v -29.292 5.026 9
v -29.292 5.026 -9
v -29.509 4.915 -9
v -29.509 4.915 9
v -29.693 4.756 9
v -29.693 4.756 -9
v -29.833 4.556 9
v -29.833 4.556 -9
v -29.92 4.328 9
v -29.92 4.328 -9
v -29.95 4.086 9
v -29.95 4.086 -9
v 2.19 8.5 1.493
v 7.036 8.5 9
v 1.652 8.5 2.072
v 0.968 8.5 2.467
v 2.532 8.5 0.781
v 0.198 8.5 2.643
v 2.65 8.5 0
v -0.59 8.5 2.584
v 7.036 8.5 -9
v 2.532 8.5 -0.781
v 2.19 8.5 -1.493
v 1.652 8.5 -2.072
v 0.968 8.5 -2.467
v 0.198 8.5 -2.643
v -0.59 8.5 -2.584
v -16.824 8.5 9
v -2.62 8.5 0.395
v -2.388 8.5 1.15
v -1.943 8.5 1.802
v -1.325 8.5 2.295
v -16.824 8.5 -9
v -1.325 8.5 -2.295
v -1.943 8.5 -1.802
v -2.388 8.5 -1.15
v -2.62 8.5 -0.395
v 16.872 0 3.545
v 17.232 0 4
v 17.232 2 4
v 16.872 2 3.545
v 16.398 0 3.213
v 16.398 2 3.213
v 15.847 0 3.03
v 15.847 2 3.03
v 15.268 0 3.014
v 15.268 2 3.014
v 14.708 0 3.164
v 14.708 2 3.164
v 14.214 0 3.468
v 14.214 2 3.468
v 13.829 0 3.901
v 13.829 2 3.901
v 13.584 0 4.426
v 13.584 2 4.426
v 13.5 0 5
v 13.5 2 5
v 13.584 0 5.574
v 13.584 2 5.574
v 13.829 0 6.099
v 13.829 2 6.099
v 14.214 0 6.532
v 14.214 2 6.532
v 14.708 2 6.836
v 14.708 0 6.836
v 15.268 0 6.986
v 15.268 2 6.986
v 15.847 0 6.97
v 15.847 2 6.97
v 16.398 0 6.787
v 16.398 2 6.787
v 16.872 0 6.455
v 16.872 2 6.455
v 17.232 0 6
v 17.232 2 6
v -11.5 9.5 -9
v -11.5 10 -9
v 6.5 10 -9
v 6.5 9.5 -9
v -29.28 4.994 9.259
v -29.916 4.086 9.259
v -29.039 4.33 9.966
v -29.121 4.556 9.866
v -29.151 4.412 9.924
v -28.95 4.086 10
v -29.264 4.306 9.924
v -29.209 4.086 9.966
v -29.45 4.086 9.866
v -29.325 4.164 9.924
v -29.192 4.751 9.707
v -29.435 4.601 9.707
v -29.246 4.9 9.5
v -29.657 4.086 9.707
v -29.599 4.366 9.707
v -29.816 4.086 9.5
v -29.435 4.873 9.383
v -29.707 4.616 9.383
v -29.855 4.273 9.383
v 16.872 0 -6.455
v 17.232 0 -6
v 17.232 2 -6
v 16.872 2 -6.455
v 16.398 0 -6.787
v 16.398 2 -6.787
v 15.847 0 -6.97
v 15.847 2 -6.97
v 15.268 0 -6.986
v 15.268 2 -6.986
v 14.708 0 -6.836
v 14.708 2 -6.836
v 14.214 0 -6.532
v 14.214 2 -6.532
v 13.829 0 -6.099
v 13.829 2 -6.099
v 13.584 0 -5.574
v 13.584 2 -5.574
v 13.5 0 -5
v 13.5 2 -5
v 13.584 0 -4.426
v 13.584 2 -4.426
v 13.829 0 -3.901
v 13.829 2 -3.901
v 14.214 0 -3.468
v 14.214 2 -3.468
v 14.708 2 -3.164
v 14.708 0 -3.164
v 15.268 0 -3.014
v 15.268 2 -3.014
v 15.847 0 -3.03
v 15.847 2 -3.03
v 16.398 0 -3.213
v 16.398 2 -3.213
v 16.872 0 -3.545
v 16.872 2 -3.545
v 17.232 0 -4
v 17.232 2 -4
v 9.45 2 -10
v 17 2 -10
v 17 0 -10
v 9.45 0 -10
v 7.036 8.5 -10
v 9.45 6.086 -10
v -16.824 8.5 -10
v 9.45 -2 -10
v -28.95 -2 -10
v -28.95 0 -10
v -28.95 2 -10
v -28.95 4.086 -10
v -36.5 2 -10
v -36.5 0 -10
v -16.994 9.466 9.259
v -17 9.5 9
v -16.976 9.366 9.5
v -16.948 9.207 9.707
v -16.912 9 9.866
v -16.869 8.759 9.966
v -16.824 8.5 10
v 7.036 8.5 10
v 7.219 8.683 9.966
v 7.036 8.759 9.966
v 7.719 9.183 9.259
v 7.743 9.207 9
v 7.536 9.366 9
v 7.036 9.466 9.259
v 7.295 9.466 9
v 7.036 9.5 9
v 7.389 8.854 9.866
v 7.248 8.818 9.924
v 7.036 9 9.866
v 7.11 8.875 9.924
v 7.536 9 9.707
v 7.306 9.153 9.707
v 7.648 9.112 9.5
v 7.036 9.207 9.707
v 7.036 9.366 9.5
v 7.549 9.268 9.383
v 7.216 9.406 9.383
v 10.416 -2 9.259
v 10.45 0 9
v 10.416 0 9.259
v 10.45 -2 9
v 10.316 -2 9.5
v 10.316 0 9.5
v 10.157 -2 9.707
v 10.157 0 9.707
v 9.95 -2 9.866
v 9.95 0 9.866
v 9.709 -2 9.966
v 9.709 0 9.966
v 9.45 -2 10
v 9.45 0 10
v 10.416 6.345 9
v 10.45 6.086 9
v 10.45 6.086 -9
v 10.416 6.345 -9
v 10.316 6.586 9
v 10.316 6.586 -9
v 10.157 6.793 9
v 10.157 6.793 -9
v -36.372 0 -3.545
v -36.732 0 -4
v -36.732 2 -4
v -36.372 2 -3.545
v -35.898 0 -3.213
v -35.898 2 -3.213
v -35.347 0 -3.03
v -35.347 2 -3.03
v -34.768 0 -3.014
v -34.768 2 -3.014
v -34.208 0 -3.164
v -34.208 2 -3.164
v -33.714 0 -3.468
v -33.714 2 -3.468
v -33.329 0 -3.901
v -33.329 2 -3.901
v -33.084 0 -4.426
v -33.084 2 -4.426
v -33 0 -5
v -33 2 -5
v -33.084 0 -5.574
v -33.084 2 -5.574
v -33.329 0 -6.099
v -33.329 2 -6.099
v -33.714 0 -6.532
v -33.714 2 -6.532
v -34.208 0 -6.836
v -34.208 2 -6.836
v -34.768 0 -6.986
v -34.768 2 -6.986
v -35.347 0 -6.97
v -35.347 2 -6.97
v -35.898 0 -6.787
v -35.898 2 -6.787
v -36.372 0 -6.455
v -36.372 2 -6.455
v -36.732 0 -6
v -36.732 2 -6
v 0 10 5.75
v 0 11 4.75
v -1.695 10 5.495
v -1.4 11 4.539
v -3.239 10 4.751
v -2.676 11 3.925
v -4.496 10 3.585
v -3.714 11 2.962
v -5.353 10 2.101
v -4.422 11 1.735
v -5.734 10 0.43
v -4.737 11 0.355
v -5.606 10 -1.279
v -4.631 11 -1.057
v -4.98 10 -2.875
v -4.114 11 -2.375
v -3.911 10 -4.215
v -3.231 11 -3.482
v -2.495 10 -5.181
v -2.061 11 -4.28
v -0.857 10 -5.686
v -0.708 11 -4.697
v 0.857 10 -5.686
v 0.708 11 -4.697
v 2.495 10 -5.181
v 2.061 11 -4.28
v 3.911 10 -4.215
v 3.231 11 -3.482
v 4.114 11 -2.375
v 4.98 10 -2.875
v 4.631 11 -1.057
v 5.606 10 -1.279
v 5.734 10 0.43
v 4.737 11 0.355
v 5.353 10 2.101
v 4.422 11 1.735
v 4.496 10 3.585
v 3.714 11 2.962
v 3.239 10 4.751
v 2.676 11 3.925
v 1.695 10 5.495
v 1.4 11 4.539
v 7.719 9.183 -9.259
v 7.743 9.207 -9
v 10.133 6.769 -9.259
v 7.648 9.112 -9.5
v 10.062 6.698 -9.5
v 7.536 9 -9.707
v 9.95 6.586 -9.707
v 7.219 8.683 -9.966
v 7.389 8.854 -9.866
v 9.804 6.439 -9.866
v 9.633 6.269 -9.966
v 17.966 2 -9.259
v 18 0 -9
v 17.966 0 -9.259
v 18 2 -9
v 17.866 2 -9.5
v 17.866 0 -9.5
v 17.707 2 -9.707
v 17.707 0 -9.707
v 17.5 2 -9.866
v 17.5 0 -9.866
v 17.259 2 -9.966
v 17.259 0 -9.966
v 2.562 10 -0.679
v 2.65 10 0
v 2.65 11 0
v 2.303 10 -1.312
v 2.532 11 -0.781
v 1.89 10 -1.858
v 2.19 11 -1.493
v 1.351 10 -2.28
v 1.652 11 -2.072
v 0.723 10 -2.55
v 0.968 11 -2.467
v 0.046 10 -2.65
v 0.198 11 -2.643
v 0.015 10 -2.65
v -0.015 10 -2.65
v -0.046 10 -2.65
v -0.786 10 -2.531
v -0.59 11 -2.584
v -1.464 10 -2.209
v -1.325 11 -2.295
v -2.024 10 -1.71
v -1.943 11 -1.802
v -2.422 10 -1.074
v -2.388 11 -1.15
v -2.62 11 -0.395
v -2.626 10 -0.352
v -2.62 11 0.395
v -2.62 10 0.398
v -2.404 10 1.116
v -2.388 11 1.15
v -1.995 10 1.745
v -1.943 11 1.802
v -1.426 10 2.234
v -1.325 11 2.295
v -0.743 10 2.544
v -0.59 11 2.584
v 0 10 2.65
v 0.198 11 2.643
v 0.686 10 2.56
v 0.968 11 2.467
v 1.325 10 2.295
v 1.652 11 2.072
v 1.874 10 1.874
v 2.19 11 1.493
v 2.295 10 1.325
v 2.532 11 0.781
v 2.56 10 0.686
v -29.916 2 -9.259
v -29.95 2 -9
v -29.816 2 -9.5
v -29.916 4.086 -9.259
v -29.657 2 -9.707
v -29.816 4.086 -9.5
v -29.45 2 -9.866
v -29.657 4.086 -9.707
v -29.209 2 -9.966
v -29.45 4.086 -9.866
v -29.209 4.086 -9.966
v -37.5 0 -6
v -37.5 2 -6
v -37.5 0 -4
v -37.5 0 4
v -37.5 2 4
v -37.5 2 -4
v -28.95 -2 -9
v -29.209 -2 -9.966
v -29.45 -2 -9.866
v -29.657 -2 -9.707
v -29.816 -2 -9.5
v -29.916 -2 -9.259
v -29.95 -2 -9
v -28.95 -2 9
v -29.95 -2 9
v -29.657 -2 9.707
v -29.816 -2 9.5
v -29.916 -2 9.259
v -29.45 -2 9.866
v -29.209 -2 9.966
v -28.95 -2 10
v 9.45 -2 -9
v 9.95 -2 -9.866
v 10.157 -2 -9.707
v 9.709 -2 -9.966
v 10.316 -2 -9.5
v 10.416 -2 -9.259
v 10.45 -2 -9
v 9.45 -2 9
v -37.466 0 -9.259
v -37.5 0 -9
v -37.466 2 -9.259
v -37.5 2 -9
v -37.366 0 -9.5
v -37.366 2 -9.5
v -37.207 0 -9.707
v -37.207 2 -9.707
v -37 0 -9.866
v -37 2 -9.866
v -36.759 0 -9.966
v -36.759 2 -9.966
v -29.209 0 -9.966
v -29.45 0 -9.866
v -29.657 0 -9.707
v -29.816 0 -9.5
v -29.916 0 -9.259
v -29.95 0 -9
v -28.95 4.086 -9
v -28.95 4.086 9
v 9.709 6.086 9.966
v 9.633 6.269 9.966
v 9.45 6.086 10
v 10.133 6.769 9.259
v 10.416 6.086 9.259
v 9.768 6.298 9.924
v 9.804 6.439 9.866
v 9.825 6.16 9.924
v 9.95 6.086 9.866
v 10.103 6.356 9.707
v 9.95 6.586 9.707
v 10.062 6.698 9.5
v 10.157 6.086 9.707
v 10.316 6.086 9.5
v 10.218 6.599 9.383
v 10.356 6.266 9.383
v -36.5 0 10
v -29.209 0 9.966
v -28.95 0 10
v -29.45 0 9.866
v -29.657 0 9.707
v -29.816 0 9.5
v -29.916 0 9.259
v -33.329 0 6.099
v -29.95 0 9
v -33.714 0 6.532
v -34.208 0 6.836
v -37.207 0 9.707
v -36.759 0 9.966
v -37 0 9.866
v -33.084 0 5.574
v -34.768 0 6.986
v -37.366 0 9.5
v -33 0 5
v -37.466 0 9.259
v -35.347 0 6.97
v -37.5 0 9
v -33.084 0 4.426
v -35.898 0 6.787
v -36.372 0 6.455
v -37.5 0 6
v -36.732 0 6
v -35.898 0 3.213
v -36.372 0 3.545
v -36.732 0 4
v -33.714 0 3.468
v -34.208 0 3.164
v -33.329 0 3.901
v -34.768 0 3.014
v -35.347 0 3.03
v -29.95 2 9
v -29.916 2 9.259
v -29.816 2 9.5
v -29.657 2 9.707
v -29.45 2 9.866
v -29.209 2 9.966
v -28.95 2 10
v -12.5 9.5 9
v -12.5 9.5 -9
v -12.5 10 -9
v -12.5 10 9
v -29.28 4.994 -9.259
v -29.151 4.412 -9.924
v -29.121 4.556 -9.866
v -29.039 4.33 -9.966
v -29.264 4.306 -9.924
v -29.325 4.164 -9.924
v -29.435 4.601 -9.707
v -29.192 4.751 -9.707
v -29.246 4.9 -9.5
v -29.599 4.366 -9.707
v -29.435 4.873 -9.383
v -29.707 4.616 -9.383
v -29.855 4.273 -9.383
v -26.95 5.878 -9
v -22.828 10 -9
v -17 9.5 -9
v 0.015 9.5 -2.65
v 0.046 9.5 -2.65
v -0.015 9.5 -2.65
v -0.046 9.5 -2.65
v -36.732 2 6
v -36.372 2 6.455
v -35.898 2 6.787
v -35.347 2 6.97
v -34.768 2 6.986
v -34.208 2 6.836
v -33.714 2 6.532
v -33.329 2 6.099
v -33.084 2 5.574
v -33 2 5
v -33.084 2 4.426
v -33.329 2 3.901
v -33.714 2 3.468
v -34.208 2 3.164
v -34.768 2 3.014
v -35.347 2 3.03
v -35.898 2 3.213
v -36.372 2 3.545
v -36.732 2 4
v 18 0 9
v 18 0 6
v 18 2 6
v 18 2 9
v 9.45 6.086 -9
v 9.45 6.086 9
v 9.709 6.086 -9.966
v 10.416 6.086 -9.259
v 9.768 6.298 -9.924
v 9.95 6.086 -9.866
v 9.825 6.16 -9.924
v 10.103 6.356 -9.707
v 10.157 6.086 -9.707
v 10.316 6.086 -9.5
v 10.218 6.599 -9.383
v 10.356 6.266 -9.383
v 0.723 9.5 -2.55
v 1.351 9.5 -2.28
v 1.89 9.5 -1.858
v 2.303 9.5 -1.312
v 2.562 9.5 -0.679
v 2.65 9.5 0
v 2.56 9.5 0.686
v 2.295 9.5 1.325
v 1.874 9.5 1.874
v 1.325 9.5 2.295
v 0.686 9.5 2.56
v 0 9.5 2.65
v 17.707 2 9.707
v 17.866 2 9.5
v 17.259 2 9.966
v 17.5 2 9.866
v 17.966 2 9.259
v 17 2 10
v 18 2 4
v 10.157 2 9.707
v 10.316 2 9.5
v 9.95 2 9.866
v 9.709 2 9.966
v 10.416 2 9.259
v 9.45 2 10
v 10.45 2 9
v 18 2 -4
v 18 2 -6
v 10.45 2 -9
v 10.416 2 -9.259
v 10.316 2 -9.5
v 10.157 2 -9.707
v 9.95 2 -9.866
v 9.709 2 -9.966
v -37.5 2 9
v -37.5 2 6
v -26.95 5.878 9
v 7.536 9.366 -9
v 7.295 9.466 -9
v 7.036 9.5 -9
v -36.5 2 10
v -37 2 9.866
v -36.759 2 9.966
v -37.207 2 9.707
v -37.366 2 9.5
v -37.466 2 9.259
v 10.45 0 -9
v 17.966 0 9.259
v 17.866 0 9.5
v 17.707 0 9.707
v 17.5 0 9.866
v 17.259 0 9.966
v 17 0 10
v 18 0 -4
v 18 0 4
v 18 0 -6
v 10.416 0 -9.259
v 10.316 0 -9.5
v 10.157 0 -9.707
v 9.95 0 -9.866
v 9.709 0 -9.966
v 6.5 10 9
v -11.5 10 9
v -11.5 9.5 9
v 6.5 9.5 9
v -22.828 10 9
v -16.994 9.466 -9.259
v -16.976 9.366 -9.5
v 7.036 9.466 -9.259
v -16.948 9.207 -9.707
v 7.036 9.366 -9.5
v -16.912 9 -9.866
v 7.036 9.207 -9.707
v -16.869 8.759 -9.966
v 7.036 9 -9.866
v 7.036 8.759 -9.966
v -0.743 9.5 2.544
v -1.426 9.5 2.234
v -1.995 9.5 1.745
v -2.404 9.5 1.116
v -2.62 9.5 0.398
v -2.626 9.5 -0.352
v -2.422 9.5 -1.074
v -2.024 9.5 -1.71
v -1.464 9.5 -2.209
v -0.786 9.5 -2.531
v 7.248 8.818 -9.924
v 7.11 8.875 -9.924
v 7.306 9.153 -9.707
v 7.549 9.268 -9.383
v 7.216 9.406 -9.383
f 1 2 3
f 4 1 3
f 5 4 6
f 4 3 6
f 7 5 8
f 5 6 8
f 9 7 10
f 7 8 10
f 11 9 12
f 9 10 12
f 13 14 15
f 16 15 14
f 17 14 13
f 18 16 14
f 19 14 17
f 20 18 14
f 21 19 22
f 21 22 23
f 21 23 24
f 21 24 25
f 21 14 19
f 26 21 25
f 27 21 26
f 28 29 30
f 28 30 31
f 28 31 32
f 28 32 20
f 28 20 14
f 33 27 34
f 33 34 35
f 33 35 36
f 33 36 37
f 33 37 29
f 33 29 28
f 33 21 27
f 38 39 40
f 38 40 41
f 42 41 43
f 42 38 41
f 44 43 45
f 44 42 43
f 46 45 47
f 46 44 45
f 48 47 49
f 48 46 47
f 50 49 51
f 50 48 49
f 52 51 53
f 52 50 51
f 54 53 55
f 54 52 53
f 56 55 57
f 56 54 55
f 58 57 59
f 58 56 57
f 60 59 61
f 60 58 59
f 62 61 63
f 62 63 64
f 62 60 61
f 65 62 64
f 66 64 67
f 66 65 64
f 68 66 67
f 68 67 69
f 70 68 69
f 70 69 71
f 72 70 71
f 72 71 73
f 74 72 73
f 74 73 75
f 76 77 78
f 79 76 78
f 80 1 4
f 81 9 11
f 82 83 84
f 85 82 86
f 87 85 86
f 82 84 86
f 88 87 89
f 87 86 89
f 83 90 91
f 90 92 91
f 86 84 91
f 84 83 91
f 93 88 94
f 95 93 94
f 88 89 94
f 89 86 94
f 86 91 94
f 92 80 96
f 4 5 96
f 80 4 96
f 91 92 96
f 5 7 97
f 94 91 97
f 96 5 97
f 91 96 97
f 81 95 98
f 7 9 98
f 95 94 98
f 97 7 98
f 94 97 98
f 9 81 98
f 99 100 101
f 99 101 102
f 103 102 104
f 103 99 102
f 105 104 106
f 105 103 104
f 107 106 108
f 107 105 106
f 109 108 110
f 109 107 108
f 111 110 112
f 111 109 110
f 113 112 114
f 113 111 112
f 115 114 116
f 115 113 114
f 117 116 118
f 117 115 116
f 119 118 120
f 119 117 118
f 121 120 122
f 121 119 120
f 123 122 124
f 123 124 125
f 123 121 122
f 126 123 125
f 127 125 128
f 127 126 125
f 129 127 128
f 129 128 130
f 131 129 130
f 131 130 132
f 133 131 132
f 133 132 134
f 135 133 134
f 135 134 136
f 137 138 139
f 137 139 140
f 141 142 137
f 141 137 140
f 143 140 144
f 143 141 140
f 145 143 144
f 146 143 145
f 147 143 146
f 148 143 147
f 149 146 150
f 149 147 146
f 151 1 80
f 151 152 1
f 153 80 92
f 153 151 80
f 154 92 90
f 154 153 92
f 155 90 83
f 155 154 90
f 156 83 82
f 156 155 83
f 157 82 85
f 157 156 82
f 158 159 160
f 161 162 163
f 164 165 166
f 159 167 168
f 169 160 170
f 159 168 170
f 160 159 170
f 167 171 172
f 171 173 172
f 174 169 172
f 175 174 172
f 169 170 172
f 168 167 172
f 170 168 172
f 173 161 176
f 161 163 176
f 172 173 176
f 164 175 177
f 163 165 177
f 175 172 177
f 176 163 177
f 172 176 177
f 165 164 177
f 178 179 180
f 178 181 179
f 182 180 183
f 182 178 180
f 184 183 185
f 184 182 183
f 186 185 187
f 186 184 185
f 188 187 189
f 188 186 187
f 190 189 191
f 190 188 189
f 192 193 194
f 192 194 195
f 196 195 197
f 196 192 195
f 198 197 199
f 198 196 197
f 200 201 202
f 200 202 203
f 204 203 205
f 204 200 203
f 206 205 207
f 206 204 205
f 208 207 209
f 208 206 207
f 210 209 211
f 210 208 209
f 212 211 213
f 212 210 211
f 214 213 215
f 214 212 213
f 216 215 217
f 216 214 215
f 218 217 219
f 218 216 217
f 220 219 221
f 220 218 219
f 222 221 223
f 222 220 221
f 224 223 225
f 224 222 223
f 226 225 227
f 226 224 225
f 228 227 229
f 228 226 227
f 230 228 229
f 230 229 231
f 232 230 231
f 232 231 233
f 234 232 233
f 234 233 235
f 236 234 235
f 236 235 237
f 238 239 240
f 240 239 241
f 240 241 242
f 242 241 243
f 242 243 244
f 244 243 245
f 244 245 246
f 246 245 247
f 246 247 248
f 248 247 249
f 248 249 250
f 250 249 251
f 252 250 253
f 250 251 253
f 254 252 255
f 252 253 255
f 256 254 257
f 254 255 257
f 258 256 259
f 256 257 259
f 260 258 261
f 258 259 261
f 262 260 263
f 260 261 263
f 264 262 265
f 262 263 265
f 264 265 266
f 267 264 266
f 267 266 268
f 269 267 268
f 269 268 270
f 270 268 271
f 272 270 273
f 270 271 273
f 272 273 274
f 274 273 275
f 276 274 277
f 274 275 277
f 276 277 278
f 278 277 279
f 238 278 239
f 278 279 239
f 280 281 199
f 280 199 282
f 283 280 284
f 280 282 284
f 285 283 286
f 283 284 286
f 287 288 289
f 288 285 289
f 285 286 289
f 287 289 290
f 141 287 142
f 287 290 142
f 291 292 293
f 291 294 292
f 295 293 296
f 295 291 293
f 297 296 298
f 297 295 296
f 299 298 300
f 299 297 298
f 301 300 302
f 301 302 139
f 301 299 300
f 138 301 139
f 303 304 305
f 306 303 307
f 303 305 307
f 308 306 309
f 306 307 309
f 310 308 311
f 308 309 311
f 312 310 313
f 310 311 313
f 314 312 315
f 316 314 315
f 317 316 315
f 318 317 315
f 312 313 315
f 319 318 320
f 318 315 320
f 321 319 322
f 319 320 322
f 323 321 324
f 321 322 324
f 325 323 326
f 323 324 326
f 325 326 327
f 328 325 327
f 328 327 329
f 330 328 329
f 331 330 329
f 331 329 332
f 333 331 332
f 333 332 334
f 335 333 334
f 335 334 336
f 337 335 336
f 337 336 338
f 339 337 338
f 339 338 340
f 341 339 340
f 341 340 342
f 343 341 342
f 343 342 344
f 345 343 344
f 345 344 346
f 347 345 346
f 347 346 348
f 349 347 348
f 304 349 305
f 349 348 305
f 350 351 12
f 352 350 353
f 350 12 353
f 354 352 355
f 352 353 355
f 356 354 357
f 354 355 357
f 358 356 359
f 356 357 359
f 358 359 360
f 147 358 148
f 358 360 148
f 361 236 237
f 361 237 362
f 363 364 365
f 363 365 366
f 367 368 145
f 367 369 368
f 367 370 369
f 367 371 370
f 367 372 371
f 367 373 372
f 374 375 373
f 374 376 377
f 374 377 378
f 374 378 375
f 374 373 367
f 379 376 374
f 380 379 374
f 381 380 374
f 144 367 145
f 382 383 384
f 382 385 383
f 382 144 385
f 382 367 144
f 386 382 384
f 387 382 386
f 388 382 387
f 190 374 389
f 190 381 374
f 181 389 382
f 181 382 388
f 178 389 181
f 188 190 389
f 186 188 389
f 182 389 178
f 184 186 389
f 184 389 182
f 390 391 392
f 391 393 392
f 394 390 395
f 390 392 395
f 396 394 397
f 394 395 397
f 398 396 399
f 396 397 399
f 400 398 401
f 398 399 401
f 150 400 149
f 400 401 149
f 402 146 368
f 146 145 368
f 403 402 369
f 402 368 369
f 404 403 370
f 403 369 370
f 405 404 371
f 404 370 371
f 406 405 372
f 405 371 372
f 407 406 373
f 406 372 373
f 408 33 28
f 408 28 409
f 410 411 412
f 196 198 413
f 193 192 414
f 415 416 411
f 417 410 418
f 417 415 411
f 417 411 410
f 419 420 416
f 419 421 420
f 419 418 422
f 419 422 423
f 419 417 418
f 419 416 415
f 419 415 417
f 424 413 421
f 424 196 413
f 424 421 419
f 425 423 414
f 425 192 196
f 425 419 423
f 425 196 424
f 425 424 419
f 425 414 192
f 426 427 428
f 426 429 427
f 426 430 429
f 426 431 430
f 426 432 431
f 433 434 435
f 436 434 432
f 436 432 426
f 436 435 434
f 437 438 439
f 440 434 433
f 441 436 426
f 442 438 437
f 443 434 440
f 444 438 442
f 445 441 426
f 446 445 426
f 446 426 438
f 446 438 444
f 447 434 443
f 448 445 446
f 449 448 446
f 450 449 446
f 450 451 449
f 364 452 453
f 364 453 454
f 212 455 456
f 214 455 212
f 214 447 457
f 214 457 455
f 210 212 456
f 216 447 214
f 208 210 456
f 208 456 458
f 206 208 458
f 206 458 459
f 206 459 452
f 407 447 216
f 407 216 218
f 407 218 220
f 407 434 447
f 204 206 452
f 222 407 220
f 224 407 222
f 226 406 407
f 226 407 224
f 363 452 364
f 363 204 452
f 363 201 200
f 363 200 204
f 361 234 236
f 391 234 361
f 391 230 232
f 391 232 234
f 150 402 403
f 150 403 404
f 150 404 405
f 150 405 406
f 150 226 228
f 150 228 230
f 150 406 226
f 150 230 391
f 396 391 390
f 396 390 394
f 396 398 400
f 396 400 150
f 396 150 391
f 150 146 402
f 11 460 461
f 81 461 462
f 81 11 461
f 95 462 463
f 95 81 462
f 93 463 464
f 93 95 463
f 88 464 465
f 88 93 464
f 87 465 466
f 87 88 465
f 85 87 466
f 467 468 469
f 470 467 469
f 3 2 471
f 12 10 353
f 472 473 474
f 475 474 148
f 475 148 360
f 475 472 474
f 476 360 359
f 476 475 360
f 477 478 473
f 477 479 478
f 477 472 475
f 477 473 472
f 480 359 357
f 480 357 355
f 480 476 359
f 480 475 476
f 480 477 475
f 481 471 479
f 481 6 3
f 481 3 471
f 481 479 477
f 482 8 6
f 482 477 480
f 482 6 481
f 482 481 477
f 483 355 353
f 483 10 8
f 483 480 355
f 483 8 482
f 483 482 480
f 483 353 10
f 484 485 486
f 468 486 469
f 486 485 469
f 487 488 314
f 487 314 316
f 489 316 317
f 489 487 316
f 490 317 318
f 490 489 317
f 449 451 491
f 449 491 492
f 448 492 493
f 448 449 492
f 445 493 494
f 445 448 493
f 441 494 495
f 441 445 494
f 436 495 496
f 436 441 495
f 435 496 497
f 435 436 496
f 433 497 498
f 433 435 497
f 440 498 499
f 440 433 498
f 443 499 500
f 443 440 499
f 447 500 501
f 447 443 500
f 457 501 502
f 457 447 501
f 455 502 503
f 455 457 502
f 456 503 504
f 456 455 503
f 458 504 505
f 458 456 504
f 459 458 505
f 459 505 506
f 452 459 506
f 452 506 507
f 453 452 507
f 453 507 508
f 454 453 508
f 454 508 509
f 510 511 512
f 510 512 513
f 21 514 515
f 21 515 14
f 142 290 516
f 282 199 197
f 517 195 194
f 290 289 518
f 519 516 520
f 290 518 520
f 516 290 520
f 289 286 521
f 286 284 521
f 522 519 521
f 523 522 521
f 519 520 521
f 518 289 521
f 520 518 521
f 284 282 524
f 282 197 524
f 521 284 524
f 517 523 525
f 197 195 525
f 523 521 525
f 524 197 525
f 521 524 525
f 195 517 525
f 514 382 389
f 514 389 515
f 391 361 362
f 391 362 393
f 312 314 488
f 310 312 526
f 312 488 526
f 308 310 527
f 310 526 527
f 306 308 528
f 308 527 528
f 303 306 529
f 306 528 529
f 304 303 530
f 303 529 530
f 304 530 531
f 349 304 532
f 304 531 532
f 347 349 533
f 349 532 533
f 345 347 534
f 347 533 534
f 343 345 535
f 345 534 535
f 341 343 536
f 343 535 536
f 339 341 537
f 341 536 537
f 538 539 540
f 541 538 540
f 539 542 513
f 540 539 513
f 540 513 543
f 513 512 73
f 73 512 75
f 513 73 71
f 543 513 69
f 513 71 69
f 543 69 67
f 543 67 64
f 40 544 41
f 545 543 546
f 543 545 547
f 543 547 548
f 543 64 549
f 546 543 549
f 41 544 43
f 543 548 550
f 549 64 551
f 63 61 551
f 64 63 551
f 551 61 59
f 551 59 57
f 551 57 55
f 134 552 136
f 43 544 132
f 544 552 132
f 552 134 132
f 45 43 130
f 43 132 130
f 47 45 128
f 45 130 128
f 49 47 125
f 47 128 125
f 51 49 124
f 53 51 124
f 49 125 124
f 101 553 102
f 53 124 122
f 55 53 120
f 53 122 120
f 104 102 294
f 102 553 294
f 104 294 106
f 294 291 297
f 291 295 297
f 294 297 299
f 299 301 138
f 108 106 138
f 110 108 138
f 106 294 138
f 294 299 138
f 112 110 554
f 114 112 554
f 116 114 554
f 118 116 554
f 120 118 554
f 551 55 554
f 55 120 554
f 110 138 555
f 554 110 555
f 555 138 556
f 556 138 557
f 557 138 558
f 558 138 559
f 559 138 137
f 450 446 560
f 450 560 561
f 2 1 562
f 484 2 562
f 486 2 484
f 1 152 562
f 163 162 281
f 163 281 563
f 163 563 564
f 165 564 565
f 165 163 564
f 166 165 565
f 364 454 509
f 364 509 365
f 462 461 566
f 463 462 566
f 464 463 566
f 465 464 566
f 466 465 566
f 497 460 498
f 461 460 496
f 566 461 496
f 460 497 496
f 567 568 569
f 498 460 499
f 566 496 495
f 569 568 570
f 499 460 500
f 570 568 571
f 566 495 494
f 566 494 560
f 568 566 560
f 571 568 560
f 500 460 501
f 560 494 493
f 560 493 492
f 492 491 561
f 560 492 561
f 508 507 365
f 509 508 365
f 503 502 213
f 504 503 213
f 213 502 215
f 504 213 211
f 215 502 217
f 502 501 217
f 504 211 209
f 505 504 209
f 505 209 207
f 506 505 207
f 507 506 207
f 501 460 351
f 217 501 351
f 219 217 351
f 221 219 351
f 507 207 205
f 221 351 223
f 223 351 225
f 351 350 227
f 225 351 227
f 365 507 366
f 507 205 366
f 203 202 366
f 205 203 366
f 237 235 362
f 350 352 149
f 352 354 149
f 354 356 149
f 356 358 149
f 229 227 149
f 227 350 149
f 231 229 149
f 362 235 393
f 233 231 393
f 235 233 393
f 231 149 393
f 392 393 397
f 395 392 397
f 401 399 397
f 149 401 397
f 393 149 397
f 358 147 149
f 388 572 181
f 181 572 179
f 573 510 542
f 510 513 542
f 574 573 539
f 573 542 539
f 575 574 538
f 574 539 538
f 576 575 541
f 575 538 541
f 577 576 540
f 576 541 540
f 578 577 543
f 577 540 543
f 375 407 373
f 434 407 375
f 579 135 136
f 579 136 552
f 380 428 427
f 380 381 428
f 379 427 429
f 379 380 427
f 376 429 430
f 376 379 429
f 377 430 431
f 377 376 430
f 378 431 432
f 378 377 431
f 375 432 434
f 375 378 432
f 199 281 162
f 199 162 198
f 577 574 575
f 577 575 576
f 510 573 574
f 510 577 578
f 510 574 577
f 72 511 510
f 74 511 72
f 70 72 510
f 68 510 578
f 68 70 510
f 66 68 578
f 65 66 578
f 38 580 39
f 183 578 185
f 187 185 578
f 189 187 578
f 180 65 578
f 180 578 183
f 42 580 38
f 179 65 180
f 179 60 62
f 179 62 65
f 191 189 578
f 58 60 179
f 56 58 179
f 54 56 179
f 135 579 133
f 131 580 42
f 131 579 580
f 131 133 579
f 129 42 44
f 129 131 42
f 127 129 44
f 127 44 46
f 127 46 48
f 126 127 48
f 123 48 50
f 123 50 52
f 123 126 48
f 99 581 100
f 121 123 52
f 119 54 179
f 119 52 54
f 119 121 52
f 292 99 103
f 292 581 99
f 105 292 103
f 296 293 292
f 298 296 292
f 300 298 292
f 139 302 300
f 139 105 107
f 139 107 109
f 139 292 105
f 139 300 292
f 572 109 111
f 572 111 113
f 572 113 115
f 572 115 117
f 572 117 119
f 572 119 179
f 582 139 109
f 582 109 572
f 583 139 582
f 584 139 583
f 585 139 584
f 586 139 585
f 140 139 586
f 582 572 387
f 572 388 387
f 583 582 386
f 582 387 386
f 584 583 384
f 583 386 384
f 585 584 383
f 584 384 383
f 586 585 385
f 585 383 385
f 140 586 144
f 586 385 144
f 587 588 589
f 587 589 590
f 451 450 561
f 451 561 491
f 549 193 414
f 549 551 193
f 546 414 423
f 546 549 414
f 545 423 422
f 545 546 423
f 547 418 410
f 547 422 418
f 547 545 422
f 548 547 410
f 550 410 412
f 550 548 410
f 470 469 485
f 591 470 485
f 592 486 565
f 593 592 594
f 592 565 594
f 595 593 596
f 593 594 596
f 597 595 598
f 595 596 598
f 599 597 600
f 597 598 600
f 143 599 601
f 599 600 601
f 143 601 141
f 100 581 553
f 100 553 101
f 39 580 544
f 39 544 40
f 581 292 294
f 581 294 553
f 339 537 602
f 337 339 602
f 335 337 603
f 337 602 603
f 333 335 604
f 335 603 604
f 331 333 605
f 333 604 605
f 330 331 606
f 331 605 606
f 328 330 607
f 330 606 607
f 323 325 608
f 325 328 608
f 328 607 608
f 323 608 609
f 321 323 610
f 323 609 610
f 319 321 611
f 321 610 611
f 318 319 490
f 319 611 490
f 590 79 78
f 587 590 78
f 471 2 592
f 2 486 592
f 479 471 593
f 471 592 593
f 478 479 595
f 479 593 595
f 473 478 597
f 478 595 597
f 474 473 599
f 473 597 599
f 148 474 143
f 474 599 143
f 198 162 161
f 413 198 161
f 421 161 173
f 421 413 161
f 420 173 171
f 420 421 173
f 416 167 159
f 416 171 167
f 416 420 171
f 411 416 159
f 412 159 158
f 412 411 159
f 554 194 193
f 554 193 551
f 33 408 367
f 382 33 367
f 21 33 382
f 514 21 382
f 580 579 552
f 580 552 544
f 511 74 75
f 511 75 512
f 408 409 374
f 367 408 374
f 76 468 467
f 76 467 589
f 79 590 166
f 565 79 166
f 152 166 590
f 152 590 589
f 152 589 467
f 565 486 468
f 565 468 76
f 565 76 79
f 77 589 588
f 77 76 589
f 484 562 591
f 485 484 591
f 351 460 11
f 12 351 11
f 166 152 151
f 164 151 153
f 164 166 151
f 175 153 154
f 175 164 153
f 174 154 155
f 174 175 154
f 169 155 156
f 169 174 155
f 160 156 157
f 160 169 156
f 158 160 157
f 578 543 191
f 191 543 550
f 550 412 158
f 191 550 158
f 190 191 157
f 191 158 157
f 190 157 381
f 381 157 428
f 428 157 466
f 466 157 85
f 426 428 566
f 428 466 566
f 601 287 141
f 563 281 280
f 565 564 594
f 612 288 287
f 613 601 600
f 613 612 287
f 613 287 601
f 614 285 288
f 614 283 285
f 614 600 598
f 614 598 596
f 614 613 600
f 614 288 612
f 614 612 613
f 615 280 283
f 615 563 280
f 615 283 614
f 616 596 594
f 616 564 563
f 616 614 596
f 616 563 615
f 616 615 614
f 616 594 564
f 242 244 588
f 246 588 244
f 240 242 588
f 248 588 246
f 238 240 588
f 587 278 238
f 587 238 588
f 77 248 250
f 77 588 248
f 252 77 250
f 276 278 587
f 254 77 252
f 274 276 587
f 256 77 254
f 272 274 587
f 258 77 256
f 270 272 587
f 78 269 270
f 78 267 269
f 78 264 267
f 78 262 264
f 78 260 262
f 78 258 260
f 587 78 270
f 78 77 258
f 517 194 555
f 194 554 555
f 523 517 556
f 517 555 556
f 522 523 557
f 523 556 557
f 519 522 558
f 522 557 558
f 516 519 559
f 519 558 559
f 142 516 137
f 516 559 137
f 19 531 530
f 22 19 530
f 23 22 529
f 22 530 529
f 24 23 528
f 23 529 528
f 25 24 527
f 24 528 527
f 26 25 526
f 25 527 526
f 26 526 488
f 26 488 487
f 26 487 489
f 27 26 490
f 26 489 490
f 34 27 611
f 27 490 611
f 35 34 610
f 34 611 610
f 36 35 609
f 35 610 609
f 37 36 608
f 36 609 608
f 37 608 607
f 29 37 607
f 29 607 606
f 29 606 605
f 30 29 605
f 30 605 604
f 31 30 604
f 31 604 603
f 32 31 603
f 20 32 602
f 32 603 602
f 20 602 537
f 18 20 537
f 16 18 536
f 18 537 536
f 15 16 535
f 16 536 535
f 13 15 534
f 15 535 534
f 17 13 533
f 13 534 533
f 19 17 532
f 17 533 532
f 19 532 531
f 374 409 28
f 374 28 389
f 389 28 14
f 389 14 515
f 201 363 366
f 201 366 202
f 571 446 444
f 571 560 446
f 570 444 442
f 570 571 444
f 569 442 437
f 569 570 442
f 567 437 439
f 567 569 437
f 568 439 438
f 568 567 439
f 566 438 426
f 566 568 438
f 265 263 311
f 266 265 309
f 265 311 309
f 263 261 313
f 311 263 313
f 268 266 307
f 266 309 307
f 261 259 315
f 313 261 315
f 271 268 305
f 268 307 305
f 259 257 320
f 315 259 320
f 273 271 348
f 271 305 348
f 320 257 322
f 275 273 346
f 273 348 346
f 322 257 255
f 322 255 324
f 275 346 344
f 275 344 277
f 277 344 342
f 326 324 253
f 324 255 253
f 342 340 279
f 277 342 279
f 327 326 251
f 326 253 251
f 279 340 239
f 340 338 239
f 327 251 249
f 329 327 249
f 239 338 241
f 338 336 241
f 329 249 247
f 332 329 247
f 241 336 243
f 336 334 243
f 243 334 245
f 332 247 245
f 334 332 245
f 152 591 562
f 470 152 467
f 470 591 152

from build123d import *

# Parameters (mm, degrees)
ESQUISSE1_W              = 38.4
ESQUISSE1_H              = 18
BOSS_EXTRU_1_DEPTH       = 2
ESQUISSE2_W              = 40.4
ESQUISSE2_H              = 20
ESQUISSE2_W_2            = 38.4
ESQUISSE2_H_2            = 18
BOSS_EXTRU_2_DEPTH       = 2
EXTRU_MINCE1_DEPTH       = 10
EXTRU_MINCE1_DEPTH_BACK  = 10
BOSS_EXTRU_3_DEPTH       = 1
ESQUISSE6_R              = 2.65
ENL_V_MAT_EXTRU_1_DEPTH  = 41.929818
BOSS_EXTRU_7_START       = -9
BOSS_EXTRU_7_DEPTH       = 18
BOSS_EXTRU_7_2_OUTLINE_W = 18
BOSS_EXTRU_7_2_OUTLINE_H = 0.5
BOSS_EXTRU_7_2_DEPTH     = 6.350393
BOSS_EXTRU_7_START_2     = 2.65
BOSS_EXTRU_7_3_OUTLINE_W = 18
BOSS_EXTRU_7_3_OUTLINE_H = 0.5
BOSS_EXTRU_7_3_DEPTH     = 6.35
BOSS_EXTRU_7_START_3     = 9.5
BOSS_EXTRU_7_4_DEPTH     = 0.5
BOSS_EXTRU_7_5_DEPTH     = 0.5
CONG_1_R                 = 1
ENL_V_MAT_EXTRU_2_DEPTH  = 44.453999


with BuildPart() as part:
    # Esquisse1 → Boss.-Extru.1 (new body)
    with BuildSketch(Plane(origin=(0, 0, 0), x_dir=(1, 0, 0), z_dir=(0, 1, 0))):
        with BuildLine():
            Line((-37.5, 10), (18, 10))
            Line((18, 10), (18, 6))
            Line((18, 6), (17.232051, 6))
            ThreePointArc((17.232051, 6), (13.5, 5), (17.232051, 4))
            Line((17.232051, 4), (18, 4))
            Line((18, 4), (18, -4))
            Line((18, -4), (17.232051, -4))
            ThreePointArc((17.232051, -4), (13.5, -5), (17.232051, -6))
            Line((17.232051, -6), (18, -6))
            Line((18, -6), (18, -10))
            Line((18, -10), (-37.5, -10))
            Line((-37.5, -10), (-37.5, -6))
            Line((-37.5, -6), (-36.732051, -6))
            ThreePointArc((-36.732051, -6), (-33, -5), (-36.732051, -4))
            Line((-36.732051, -4), (-37.5, -4))
            Line((-37.5, -4), (-37.5, 4))
            Line((-37.5, 4), (-36.732051, 4))
            ThreePointArc((-36.732051, 4), (-33, 5), (-36.732051, 6))
            Line((-36.732051, 6), (-37.5, 6))
            Line((-37.5, 6), (-37.5, 10))
        make_face()
        with Locations((-9.75, 0)):
            Rectangle(ESQUISSE1_W, ESQUISSE1_H, mode=Mode.SUBTRACT)
    extrude(amount=BOSS_EXTRU_1_DEPTH)

    # Esquisse2 → Boss.-Extru.2 (add)
    with BuildSketch(Plane.XZ):
        with Locations((-9.75, 0)):
            Rectangle(ESQUISSE2_W, ESQUISSE2_H)
        with Locations((-9.75, 0)):
            Rectangle(ESQUISSE2_W_2, ESQUISSE2_H_2, mode=Mode.SUBTRACT)
    extrude(amount=BOSS_EXTRU_2_DEPTH)

    # Esquisse3 → Extru.-Mince1 (add, two sides: drawn at the far end of the back side and taken through both)
    with BuildSketch(Plane.XY.offset(-EXTRU_MINCE1_DEPTH_BACK)):
        Polygon((-29.95, 2), (-29.95, 4.786585), (-17, 9.5), (7.45, 9.5), (10.45, 6.5), (10.45, 2), (9.45, 2), (9.45, 6.085786), (7.035786, 8.5), (-16.823673, 8.5), (-28.95, 4.086378), (-28.95, 2), align=None)
    extrude(amount=EXTRU_MINCE1_DEPTH + EXTRU_MINCE1_DEPTH_BACK)

    # Esquisse4 → Boss.-Extru.3 (add)
    with BuildSketch(Plane.XY.offset(10)):
        Polygon((10.45, 6.5), (10.45, 2), (-29.95, 2), (-29.95, 4.786585), (-17, 9.5), (7.45, 9.5), align=None)
    boss_extru_3 = extrude(amount=-BOSS_EXTRU_3_DEPTH)

    # Symétrie1: Boss.-Extru.3 across plane
    add(boss_extru_3.mirror(Plane.XY))

    # Esquisse5 → Révolution1 (revolve)
    with BuildSketch(Plane.XY, mode=Mode.PRIVATE) as r_volution1_sk:
        Polygon((-6.25, 9.5), (-4.75, 11), (0, 11), (0, 10), (-4.335786, 10), (-5.542893, 8.792893), align=None)
    revolve(r_volution1_sk.sketch.rotate(Axis((0, 11, 0), (0, -1, 0)), 270), axis=Axis((0, 11, 0), (0, -1, 0)))

    # Esquisse6 → Enlèv. mat.-Extru.1 (cut, through all)
    with BuildSketch(Plane(origin=(0, 11, 0), x_dir=(1, 0, 0), z_dir=(0, 1, 0))):
        Circle(ESQUISSE6_R)
    extrude(amount=-ENL_V_MAT_EXTRU_1_DEPTH, mode=Mode.SUBTRACT)

    # Boss.-Extru.7: read off the stored shape, not the designer's step
    # Boss.-Extru.7 outline → Boss.-Extru.7 (add)
    with BuildSketch(Plane.XY.offset(BOSS_EXTRU_7_START)):
        Polygon((-12.5, 10), (-26.95, 10), (-26.95, 5.878496), (-17, 9.5), (-12.5, 9.5), align=None)
    extrude(amount=BOSS_EXTRU_7_DEPTH)

    # Boss.-Extru.7 2 outline → Boss.-Extru.7 2 (add)
    with BuildSketch(Plane.XY.offset(BOSS_EXTRU_7_START)):
        with Locations((-2.5, 9.75)):
            Rectangle(BOSS_EXTRU_7_2_OUTLINE_W, BOSS_EXTRU_7_2_OUTLINE_H)
    extrude(amount=BOSS_EXTRU_7_2_DEPTH)

    # Boss.-Extru.7 3 outline → Boss.-Extru.7 3 (add)
    with BuildSketch(Plane.XY.offset(BOSS_EXTRU_7_START_2)):
        with Locations((-2.5, 9.75)):
            Rectangle(BOSS_EXTRU_7_3_OUTLINE_W, BOSS_EXTRU_7_3_OUTLINE_H)
    extrude(amount=BOSS_EXTRU_7_3_DEPTH)

    # Boss.-Extru.7 4 outline → Boss.-Extru.7 4 (cut)
    with BuildSketch(Plane(origin=(0, 0, 0), x_dir=(1, 0, 0), z_dir=(0, 1, 0)).offset(BOSS_EXTRU_7_START_3)):
        with BuildLine():
            Line((-0.04562, 2.649607), (0.04562, 2.649607))
            ThreePointArc((0.04562, 2.649607), (0, 2.65), (-0.04562, 2.649607))
        make_face()
    extrude(amount=BOSS_EXTRU_7_4_DEPTH, mode=Mode.SUBTRACT)

    # Boss.-Extru.7 5 outline → Boss.-Extru.7 5 (add)
    with BuildSketch(Plane(origin=(0, 0, 0), x_dir=(1, 0, 0), z_dir=(0, 1, 0)).offset(BOSS_EXTRU_7_START_3)):
        with BuildLine():
            ThreePointArc((0.04562, 2.649607), (2.649902, -0.022811), (0, -2.65))
            Line((0, -2.65), (6.5, -2.65))
            Line((6.5, -2.65), (6.5, 2.649607))
            Line((6.5, 2.649607), (0.04562, 2.649607))
        make_face()
        with BuildLine():
            Line((-11.5, -2.65), (0, -2.65))
            ThreePointArc((0, -2.65), (-2.649902, -0.022811), (-0.04562, 2.649607))
            Line((-0.04562, 2.649607), (-11.5, 2.649607))
            Line((-11.5, 2.649607), (-11.5, -2.65))
        make_face()
    extrude(amount=BOSS_EXTRU_7_5_DEPTH)

    # Congé1
    cong_1_edges = [part.edges().sort_by_distance(p)[0] for p in [
        (-29.95, 4.786585, 0),
        (-23.475, 7.143293, -10),
        (-23.475, 7.143293, 10),
        (-4.775, 9.5, 10),
        (-4.775, 9.5, -10),
        (7.45, 9.5, 0),
        (10.45, 6.5, 0),
        (8.95, 8, 10),
        (8.95, 8, -10),
        (10.45, 4.25, 10),
        (10.45, 4.25, -10),
        (18, 1, -10),
        (18, 1, 10),
        (10.45, -1, 10),
        (-29.95, -1, 10),
        (-29.95, 3.393293, 10),
        (-29.95, 3.393293, -10),
        (-29.95, -1, -10),
        (-37.5, 1, -10),
        (-37.5, 1, 10),
        (10.45, -1, -10),
    ]]
    fillet(cong_1_edges, radius=CONG_1_R - 0.0001)  # a hair under: the kernel refuses the full size

    # Esquisse11 → Enlèv. mat.-Extru.2 (cut, through all)
    with BuildSketch(Plane(origin=(0, 0, -9), x_dir=(-1, 0, 0), z_dir=(0, 0, -1))):
        Polygon((26.95, 5.878496), (21.455546, 11.37295), (30.404027, 11.37295), align=None)
    extrude(amount=-ENL_V_MAT_EXTRU_2_DEPTH, mode=Mode.SUBTRACT)


solid = part.part
